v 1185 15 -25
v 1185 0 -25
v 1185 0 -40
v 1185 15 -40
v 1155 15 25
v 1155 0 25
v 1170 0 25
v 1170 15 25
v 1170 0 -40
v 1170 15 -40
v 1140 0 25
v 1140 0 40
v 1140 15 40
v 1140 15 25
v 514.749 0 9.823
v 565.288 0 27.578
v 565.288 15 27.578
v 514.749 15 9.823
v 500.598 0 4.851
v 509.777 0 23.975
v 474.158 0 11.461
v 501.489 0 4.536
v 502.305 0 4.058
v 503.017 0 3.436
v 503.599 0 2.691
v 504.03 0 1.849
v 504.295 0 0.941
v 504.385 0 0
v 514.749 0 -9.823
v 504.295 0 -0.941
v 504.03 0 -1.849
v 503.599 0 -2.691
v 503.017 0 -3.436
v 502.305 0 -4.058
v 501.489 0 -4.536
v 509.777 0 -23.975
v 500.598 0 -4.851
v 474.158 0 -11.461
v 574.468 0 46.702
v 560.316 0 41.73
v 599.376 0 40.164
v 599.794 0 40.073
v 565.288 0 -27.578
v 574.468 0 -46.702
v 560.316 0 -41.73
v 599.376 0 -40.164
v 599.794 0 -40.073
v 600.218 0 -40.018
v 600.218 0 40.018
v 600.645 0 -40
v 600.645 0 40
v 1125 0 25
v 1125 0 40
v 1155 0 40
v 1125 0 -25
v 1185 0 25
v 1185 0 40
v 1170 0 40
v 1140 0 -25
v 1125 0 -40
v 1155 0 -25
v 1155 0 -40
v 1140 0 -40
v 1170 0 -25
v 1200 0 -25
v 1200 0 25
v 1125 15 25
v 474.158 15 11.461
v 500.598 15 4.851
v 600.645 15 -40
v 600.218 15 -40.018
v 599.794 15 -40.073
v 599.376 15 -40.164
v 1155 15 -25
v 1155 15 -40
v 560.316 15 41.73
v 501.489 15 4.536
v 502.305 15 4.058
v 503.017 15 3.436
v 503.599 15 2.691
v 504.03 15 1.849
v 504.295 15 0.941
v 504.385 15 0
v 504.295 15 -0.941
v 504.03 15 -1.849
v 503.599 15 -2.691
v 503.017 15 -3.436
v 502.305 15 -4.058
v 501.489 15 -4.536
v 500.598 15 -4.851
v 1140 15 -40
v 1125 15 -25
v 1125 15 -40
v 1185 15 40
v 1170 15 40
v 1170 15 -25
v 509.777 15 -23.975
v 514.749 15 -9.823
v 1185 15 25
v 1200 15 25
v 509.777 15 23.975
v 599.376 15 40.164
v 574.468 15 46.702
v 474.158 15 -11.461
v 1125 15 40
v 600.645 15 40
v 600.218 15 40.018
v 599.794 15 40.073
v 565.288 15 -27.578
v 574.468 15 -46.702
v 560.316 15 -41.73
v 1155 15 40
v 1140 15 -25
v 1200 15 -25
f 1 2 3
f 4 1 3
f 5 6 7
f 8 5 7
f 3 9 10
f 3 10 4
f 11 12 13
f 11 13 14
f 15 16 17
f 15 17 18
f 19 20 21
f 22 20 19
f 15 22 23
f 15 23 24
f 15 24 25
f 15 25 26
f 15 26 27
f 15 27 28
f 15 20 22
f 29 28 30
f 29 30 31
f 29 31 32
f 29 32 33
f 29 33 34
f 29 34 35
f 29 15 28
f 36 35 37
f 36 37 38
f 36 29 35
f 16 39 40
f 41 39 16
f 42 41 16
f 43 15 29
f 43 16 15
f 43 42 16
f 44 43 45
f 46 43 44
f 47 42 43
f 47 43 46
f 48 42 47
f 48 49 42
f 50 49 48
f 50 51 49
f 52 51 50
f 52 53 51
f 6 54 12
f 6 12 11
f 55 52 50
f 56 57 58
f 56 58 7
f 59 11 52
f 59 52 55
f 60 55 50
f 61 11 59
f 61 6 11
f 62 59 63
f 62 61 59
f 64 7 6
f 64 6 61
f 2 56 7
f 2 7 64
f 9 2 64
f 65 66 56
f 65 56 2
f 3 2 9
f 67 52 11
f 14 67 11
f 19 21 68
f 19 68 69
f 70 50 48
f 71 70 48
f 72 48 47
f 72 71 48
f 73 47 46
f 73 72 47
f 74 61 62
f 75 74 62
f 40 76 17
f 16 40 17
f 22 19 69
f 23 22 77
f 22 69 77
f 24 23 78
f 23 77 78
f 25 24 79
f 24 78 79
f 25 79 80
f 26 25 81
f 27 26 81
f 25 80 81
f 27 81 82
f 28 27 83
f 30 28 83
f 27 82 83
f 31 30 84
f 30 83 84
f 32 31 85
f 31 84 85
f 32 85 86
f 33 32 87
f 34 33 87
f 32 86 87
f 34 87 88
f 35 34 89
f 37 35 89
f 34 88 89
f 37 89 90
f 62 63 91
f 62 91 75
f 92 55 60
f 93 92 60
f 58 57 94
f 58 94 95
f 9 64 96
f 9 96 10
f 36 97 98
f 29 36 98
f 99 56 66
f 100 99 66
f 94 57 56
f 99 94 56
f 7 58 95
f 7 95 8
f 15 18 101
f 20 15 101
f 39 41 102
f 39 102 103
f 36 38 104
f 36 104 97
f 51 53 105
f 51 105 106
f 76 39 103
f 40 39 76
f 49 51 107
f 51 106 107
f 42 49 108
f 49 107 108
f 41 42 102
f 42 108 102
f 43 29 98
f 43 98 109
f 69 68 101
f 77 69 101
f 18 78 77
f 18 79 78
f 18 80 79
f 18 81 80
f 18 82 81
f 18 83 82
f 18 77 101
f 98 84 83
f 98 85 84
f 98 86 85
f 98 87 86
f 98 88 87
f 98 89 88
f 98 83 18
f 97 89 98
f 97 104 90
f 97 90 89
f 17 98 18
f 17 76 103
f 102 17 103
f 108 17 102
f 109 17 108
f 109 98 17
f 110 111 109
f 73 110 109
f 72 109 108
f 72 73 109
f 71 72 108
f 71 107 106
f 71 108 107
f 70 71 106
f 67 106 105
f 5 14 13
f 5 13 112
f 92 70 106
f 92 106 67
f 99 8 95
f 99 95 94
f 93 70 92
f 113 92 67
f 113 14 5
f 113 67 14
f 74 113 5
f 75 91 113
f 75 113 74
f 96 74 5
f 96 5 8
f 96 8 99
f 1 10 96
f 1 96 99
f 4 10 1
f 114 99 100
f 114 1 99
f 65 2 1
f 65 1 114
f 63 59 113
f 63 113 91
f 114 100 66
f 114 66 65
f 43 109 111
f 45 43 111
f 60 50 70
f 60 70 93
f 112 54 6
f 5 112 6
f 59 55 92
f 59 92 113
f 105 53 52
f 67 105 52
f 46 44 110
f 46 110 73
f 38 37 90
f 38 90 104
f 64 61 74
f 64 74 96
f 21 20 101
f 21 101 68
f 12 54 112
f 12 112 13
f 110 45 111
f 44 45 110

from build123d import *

# Parameters (mm, degrees)
BOSS_EXTRUDE1_DEPTH             = 15
BOSS_EXTRUDE2_REACH             = 1239.023
BOSS_EXTRUDE2_DIRECTION_2_REACH = 1239.023
CUT_EXTRUDE2_DEPTH              = 1238.578280352
CUT_EXTRUDE2_DEPTH_BACK         = 1238.578280352
SKETCH5_W                       = 40
SKETCH5_H                       = 40
CUT_EXTRUDE3_DEPTH              = 1238.578280352
BOSS_EXTRUDE4_DEPTH             = 75
CUT_EXTRUDE4_DEPTH              = 1241.107934819
CUT_EXTRUDE4_DEPTH_BACK         = 1241.107934819
SKETCH8_W                       = 15
SKETCH8_H                       = 73.7
FILLET1_R                       = 5
CUT_EXTRUDE5_DEPTH              = 1241.107934819
CUT_EXTRUDE5_DEPTH_BACK         = 1241.107934819
SKETCH9_W                       = 25
SKETCH9_H                       = 15
SKETCH9_W_2                     = 15
CUT_EXTRUDE6_DEPTH              = 1241.107934819
CUT_EXTRUDE6_DEPTH_BACK         = 1241.107934819
SKETCH10_W                      = 1728.920732784
SKETCH10_H                      = 178.853868908
SKETCH10_W_2                    = 1650
SKETCH10_H_2                    = 15
CUT_EXTRUDE8_DEPTH              = 1238.022635201


with BuildPart() as part:
    # Sketch1 → Boss-Extrude1 (new body)
    with BuildSketch(Plane(origin=(0, 0, 0), x_dir=(1, 0, 0), z_dir=(0, 1, 0))):
        Polygon((-450, 300), (-400, 300), (-200, 250), (600, 40), (1200, 40), (1200, -40), (600, -40), (-200, -250), (-400, -300), (-450, -300), align=None)
    extrude(amount=BOSS_EXTRUDE1_DEPTH)

    # Boss-Extrude2: up to this face of the body (flat: up to its plane)
    boss_extrude2_end = Plane(part.part.faces().sort_by_distance((-425, 7.5, 300))[0])
    # Sketch2 → Boss-Extrude2 (add, up to the picked face)
    with BuildSketch(Plane.XY, mode=Mode.PRIVATE) as boss_extrude2_sk1:
        with BuildLine():
            Line((-425, 0), (-450, 0))
            Line((-450, 0), (-450, -40))
            Line((-450, -40), (-440, -40))
            Line((-440, -40), (-440, -15))
            ThreePointArc((-440, -15), (-435.606601718, -4.393398282), (-425, 0))
        make_face()
    boss_extrude2_tool1 = split(extrude(boss_extrude2_sk1.sketch, amount=BOSS_EXTRUDE2_REACH, mode=Mode.PRIVATE), bisect_by=boss_extrude2_end, keep=Keep.BOTH, mode=Mode.PRIVATE)
    # Sketch2 → Boss-Extrude2 (add, up to the picked face)
    with BuildSketch(Plane.XY, mode=Mode.PRIVATE) as boss_extrude2_sk2:
        with BuildLine():
            Line((-400, 0), (-425, 0))
            ThreePointArc((-425, 0), (-414.393398282, -4.393398282), (-410, -15))
            Line((-410, -15), (-410, -40))
            Line((-410, -40), (-400, -40))
            Line((-400, -40), (-400, 0))
        make_face()
    boss_extrude2_tool2 = split(extrude(boss_extrude2_sk2.sketch, amount=BOSS_EXTRUDE2_REACH, mode=Mode.PRIVATE), bisect_by=boss_extrude2_end, keep=Keep.BOTH, mode=Mode.PRIVATE)
    add(boss_extrude2_tool1.solids().sort_by(Axis((-444.100555, -18.206662, 0), (0, 0, 1)))[0])
    add(boss_extrude2_tool2.solids().sort_by(Axis((-405.899445, -18.206662, 0), (0, 0, 1)))[0])

    # Boss-Extrude2 direction 2: up to this face of the body (flat: up to its plane)
    boss_extrude2_direction_2_end = Plane(part.part.faces().sort_by_distance((-425, 7.5, -300))[0])
    # Sketch2 → Boss-Extrude2 direction 2 (add, up to the picked face)
    with BuildSketch(Plane.XY, mode=Mode.PRIVATE) as boss_extrude2_direction_2_sk1:
        with BuildLine():
            Line((-425, 0), (-450, 0))
            Line((-450, 0), (-450, -40))
            Line((-450, -40), (-440, -40))
            Line((-440, -40), (-440, -15))
            ThreePointArc((-440, -15), (-435.606601718, -4.393398282), (-425, 0))
        make_face()
    boss_extrude2_direction_2_tool1 = split(extrude(boss_extrude2_direction_2_sk1.sketch, amount=-BOSS_EXTRUDE2_DIRECTION_2_REACH, mode=Mode.PRIVATE), bisect_by=boss_extrude2_direction_2_end, keep=Keep.BOTH, mode=Mode.PRIVATE)
    # Sketch2 → Boss-Extrude2 direction 2 (add, up to the picked face)
    with BuildSketch(Plane.XY, mode=Mode.PRIVATE) as boss_extrude2_direction_2_sk2:
        with BuildLine():
            Line((-400, 0), (-425, 0))
            ThreePointArc((-425, 0), (-414.393398282, -4.393398282), (-410, -15))
            Line((-410, -15), (-410, -40))
            Line((-410, -40), (-400, -40))
            Line((-400, -40), (-400, 0))
        make_face()
    boss_extrude2_direction_2_tool2 = split(extrude(boss_extrude2_direction_2_sk2.sketch, amount=-BOSS_EXTRUDE2_DIRECTION_2_REACH, mode=Mode.PRIVATE), bisect_by=boss_extrude2_direction_2_end, keep=Keep.BOTH, mode=Mode.PRIVATE)
    add(boss_extrude2_direction_2_tool1.solids().sort_by(Axis((-444.100555, -18.206662, 0), (0, 0, -1)))[0])
    add(boss_extrude2_direction_2_tool2.solids().sort_by(Axis((-405.899445, -18.206662, 0), (0, 0, -1)))[0])

    # Sketch4 → Cut-Extrude2 (cut, two sides: drawn at the far end of the back side and taken through both)
    with BuildSketch(Plane(origin=(0, 0, 0), x_dir=(1, 0, 0), z_dir=(0, 1, 0)).offset(-CUT_EXTRUDE2_DEPTH_BACK)):
        Polygon((-450, 230), (-400, 230), (-150, 167.5), (-150, -167.5), (-400, -230), (-450, -230), align=None)
        Polygon((-100, 155), (-100, -155), (520, 0), align=None)
    extrude(amount=CUT_EXTRUDE2_DEPTH + CUT_EXTRUDE2_DEPTH_BACK, mode=Mode.SUBTRACT)

    # Sketch5 → Cut-Extrude3 (cut, through all)
    with BuildSketch(Plane(origin=(0, 0, 0), x_dir=(0, 0, -1), z_dir=(1, 0, 0))):
        with Locations((-265, -20)):
            Rectangle(SKETCH5_W, SKETCH5_H)
        with Locations((265, -20)):
            Rectangle(SKETCH5_W, SKETCH5_H)
    extrude(amount=-CUT_EXTRUDE3_DEPTH, mode=Mode.SUBTRACT)

    # Sketch7 → Boss-Extrude4 (add)
    with BuildSketch(Plane(origin=(1200, 0, 0), x_dir=(0, 0, -1), z_dir=(1, 0, 0))):
        with BuildLine():
            Line((-87.5, 50), (-40, 15))
            Line((-40, 15), (40, 15))
            Line((40, 15), (87.5, 50))
            Line((87.5, 50), (87.5, 88.7))
            Line((87.5, 88.7), (58.5, 88.7))
            Line((58.5, 88.7), (58.5, 63.2))
            Line((58.5, 63.2), (48.5, 63.2))
            Line((48.5, 63.2), (48.5, 88.7))
            Line((48.5, 88.7), (20, 88.7))
            Line((20, 88.7), (20, 50))
            ThreePointArc((20, 50), (0, 30), (-20, 50))
            Line((-20, 50), (-20, 88.7))
            Line((-20, 88.7), (-63, 88.7))
            Line((-63, 88.7), (-63, 63.2))
            Line((-63, 63.2), (-73, 63.2))
            Line((-73, 63.2), (-73, 88.7))
            Line((-73, 88.7), (-87.5, 88.7))
            Line((-87.5, 88.7), (-87.5, 50))
        make_face()
    extrude(amount=-BOSS_EXTRUDE4_DEPTH)

    # Sketch8 → Cut-Extrude4 (cut, two sides: drawn at the far end of the back side and taken through both)
    with BuildSketch(Plane.XY.offset(-CUT_EXTRUDE4_DEPTH_BACK)):
        with Locations((1147.5, 51.85)):
            Rectangle(SKETCH8_W, SKETCH8_H)
        with Locations((1177.5, 51.85)):
            Rectangle(SKETCH8_W, SKETCH8_H)
    extrude(amount=CUT_EXTRUDE4_DEPTH + CUT_EXTRUDE4_DEPTH_BACK, mode=Mode.SUBTRACT)

    # Fillet1
    fillet1_edges = [part.edges().sort_by_distance(p)[0] for p in [
        (1192.5, 50, 87.5),
        (1162.5, 50, 87.5),
        (1132.5, 50, 87.5),
        (1192.5, 50, -87.5),
        (1162.5, 50, -87.5),
        (1132.5, 50, -87.5),
        (1192.5, 88.7, -87.5),
        (1162.5, 88.7, -87.5),
        (1132.5, 88.7, -87.5),
        (1132.5, 88.7, -58.5),
        (1162.5, 88.7, -58.5),
        (1192.5, 88.7, -58.5),
        (1192.5, 88.7, -48.5),
        (1162.5, 88.7, -48.5),
        (1132.5, 88.7, -48.5),
        (1192.5, 88.7, -20),
        (1162.5, 88.7, -20),
        (1132.5, 88.7, -20),
        (1192.5, 88.7, 63),
        (1162.5, 88.7, 63),
        (1132.5, 88.7, 63),
        (1132.5, 88.7, 87.5),
        (1162.5, 88.7, 87.5),
        (1192.5, 88.7, 87.5),
        (1192.5, 88.7, 73),
        (1162.5, 88.7, 73),
        (1132.5, 88.7, 73),
        (1192.5, 88.7, 20),
        (1162.5, 88.7, 20),
        (1132.5, 88.7, 20),
        (600, 7.5, 40),
        (600, 7.5, -40),
        (520, 7.5, 0),
        (-440, -40, -292.5),
        (-440, -40, -237.5),
        (-400, -40, -292.5),
        (-400, -40, -237.5),
        (-450, -40, -237.5),
        (-410, -40, -237.5),
        (-450, -40, -292.5),
        (-410, -40, -292.5),
        (-150, 7.5, 167.5),
        (-100, 7.5, 155),
        (-150, 7.5, -167.5),
        (-100, 7.5, -155),
        (-450, -40, 237.5),
        (-410, -40, 237.5),
        (-440, -40, 237.5),
        (-400, -40, 237.5),
        (-450, -40, 292.5),
        (-440, -40, 292.5),
        (-400, -40, 292.5),
        (-410, -40, 292.5),
    ]]
    fillet(fillet1_edges, radius=FILLET1_R - 0.0001)  # a hair under: the kernel refuses the full size

    # Sketch9 → Cut-Extrude5 (cut, two sides: drawn at the far end of the back side and taken through both)
    with BuildSketch(Plane(origin=(0, 0, 0), x_dir=(1, 0, 0), z_dir=(0, 1, 0)).offset(-CUT_EXTRUDE5_DEPTH_BACK)):
        with Locations((-425, -292.5)):
            Rectangle(SKETCH9_W, SKETCH9_H)
        with Locations((1192.5, -32.5)):
            Rectangle(SKETCH9_W_2, SKETCH9_H)
        with Locations((1192.5, 32.5)):
            Rectangle(SKETCH9_W_2, SKETCH9_H)
        with Locations((1162.5, 32.5)):
            Rectangle(SKETCH9_W_2, SKETCH9_H)
        with Locations((1132.5, 32.5)):
            Rectangle(SKETCH9_W_2, SKETCH9_H)
        with Locations((1132.5, -32.5)):
            Rectangle(SKETCH9_W_2, SKETCH9_H)
        with Locations((1162.5, -32.5)):
            Rectangle(SKETCH9_W_2, SKETCH9_H)
        with Locations((-425, -237.5)):
            Rectangle(SKETCH9_W, SKETCH9_H)
        with Locations((-425, 237.5)):
            Rectangle(SKETCH9_W, SKETCH9_H)
        with Locations((-425, 292.5)):
            Rectangle(SKETCH9_W, SKETCH9_H)
    extrude(amount=CUT_EXTRUDE5_DEPTH + CUT_EXTRUDE5_DEPTH_BACK, mode=Mode.SUBTRACT)


with BuildPart() as cut_extrude5_piece_1:
    # of the separate pieces the step leaves, piece 1, a body of its own (cut_extrude5_pieces)
    add(part.part.solids().sort_by_distance((-400, -35.0001, -300))[0])


with BuildPart() as cut_extrude5_piece_2:
    # of the separate pieces the step leaves, piece 2, a body of its own (cut_extrude5_pieces)
    add(part.part.solids().sort_by_distance((1170, 48.501289589, 85.46603587))[0])


with BuildPart() as cut_extrude5_piece_3:
    # of the separate pieces the step leaves, piece 3, a body of its own (cut_extrude5_pieces)
    add(part.part.solids().sort_by_distance((1170, 48.501289589, -85.46603587))[0])


with BuildPart() as cut_extrude5_piece_4:
    # of the separate pieces the step leaves, piece 4, a body of its own (cut_extrude5_pieces)
    add(part.part.solids().sort_by_distance((1125, 83.7001, 73))[0])


with BuildPart() as cut_extrude5_piece_5:
    # of the separate pieces the step leaves, piece 5, a body of its own (cut_extrude5_pieces)
    add(part.part.solids().sort_by_distance((1200, 48.501289589, 85.46603587))[0])


with BuildPart() as cut_extrude5_piece_6:
    # of the separate pieces the step leaves, piece 6, a body of its own (cut_extrude5_pieces)
    add(part.part.solids().sort_by_distance((1200, 48.501289589, -85.46603587))[0])


with BuildPart() as cut_extrude5_piece_7:
    # of the separate pieces the step leaves, piece 7, a body of its own (cut_extrude5_pieces)
    add(part.part.solids().sort_by_distance((1125, 88.7, -40))[0])


with BuildPart() as cut_extrude6_tool:
    # Sketch10 → Cut-Extrude6 (new, two sides: drawn at the far end of the back side and taken through both)
    with BuildSketch(Plane.XY.offset(-CUT_EXTRUDE6_DEPTH_BACK)):
        with Locations((378.379601058, 20.599691165)):
            Rectangle(SKETCH10_W, SKETCH10_H)
        with Locations((375, 7.5)):
            Rectangle(SKETCH10_W_2, SKETCH10_H_2, mode=Mode.SUBTRACT)
    extrude(amount=CUT_EXTRUDE6_DEPTH + CUT_EXTRUDE6_DEPTH_BACK)


with BuildPart() as cut_extrude5_piece_1_1:
    add(cut_extrude5_piece_1.part)

    # Cut-Extrude6: cut by cut_extrude6_tool
    add(cut_extrude6_tool.part, mode=Mode.SUBTRACT)

    # Sketch12 → Cut-Extrude8 (cut, through all)
    with BuildSketch(Plane(origin=(0, 0, 0), x_dir=(1, 0, 0), z_dir=(0, 1, 0))):
        Polygon((474.15750273, -11.460624318), (441.536230577, 0), (474.15750273, 11.460624318), (509.777233765, 23.974678146), (560.316098949, 41.730176601), (574.468123656, 46.70211754), (600.645318554, 55.898785132), (600.645318554, 300), (-450, 300), (-450, -300), (600.645318554, -300), (600.645318554, -55.898785132), (574.468123656, -46.70211754), (560.316098949, -41.730176601), (509.777233765, -23.974678146), align=None)
        Polygon((514.749174704, -9.82265344), (509.777233765, -23.974678146), (560.316098949, -41.730176601), (565.288039888, -27.578151895), align=None)
        Polygon((560.316098949, 41.730176601), (509.777233765, 23.974678146), (514.749174704, 9.82265344), (565.288039888, 27.578151895), align=None)
    extrude(amount=CUT_EXTRUDE8_DEPTH, mode=Mode.SUBTRACT)


with BuildPart() as cut_extrude5_piece_2_1:
    add(cut_extrude5_piece_2.part)

    # Cut-Extrude6: cut by cut_extrude6_tool
    add(cut_extrude6_tool.part, mode=Mode.SUBTRACT)


with BuildPart() as cut_extrude5_piece_3_1:
    add(cut_extrude5_piece_3.part)

    # Cut-Extrude6: cut by cut_extrude6_tool
    add(cut_extrude6_tool.part, mode=Mode.SUBTRACT)


with BuildPart() as cut_extrude5_piece_4_1:
    add(cut_extrude5_piece_4.part)

    # Cut-Extrude6: cut by cut_extrude6_tool
    add(cut_extrude6_tool.part, mode=Mode.SUBTRACT)


with BuildPart() as cut_extrude5_piece_5_1:
    add(cut_extrude5_piece_5.part)

    # Cut-Extrude6: cut by cut_extrude6_tool
    add(cut_extrude6_tool.part, mode=Mode.SUBTRACT)


with BuildPart() as cut_extrude5_piece_6_1:
    add(cut_extrude5_piece_6.part)

    # Cut-Extrude6: cut by cut_extrude6_tool
    add(cut_extrude6_tool.part, mode=Mode.SUBTRACT)


with BuildPart() as cut_extrude5_piece_7_1:
    add(cut_extrude5_piece_7.part)

    # Cut-Extrude6: cut by cut_extrude6_tool
    add(cut_extrude6_tool.part, mode=Mode.SUBTRACT)


solid = cut_extrude5_piece_1_1.part
